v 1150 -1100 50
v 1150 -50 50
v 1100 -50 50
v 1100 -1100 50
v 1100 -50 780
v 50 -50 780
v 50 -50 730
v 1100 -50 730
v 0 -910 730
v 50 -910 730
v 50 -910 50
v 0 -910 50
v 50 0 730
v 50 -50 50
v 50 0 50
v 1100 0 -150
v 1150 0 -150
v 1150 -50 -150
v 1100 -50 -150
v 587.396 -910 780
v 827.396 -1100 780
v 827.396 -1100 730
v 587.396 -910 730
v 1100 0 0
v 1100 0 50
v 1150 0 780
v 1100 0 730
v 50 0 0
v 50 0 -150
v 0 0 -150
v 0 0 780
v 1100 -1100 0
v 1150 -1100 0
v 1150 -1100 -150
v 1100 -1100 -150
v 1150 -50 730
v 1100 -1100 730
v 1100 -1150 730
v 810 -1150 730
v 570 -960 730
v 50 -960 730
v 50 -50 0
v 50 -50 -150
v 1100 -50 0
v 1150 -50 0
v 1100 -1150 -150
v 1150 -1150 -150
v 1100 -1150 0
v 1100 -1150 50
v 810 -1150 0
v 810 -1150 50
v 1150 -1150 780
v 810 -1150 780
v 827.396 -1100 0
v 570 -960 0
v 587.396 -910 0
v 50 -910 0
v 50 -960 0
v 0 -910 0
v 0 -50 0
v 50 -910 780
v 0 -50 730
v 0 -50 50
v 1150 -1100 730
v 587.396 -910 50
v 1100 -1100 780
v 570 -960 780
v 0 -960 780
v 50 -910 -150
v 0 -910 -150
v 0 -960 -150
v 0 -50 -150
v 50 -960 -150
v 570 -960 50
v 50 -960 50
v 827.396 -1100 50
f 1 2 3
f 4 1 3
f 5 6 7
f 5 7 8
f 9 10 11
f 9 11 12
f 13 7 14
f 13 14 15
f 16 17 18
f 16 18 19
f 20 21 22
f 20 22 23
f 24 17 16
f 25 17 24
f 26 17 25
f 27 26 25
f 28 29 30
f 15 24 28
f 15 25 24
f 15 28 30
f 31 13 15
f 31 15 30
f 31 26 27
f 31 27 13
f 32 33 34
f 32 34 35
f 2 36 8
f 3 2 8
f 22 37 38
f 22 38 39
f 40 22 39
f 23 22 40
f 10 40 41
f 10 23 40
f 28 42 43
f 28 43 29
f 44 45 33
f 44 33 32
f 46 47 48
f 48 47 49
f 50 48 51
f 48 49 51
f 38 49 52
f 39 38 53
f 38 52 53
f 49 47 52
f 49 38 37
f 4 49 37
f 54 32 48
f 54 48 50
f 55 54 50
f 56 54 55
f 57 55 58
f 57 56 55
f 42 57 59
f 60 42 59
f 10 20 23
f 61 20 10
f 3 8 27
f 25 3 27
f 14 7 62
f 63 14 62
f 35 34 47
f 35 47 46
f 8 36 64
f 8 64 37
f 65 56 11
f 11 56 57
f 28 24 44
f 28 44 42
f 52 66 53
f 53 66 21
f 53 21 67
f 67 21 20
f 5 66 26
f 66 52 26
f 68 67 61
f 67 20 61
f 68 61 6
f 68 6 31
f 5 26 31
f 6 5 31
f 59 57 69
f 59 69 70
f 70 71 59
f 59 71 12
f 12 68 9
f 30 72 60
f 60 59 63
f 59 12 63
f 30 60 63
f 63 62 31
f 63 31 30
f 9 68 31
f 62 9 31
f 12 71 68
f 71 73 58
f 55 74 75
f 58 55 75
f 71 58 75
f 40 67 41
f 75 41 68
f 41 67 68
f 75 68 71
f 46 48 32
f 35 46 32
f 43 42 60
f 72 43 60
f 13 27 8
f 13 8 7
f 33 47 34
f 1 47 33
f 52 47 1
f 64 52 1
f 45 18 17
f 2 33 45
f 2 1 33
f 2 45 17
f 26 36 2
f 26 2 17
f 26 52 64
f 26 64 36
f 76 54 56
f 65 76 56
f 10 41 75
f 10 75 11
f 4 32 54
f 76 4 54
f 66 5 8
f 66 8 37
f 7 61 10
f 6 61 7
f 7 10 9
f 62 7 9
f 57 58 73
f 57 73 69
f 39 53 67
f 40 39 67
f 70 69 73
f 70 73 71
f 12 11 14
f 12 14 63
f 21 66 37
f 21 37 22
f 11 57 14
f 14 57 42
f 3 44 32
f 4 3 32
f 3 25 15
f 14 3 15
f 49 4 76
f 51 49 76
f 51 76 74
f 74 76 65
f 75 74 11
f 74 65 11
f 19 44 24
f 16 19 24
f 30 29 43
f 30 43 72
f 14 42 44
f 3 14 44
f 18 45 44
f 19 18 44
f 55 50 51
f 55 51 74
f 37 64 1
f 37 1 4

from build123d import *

# Parameters (mm, degrees)
ESTRUSIONE_ESTRUSIONE1_DEPTH = 50
ESTRUSIONE_ESTRUSIONE4_DEPTH = 50
SCHIZZO5_W                   = 50
SCHIZZO5_H                   = 50
ESTRUSIONE_ESTRUSIONE5_DEPTH = 680
SCHIZZO6_W                   = 50
SCHIZZO6_H                   = 50
ESTRUSIONE_ESTRUSIONE6_DEPTH = 150


with BuildPart() as part:
    # Schizzo1 → Estrusione-Estrusione1 (new body)
    with BuildSketch(Plane.XY):
        Polygon((0, 0), (1150, 0), (1150, -1150), (810, -1150), (570, -960), (0, -960), align=None)
        Polygon((50, -50), (1100, -50), (1100, -1100), (827.395936132, -1100), (587.395936132, -910), (50, -910), align=None, mode=Mode.SUBTRACT)
    extrude(amount=ESTRUSIONE_ESTRUSIONE1_DEPTH)



with BuildPart() as body_2:
    # Schizzo4 → Estrusione-Estrusione4 (new body)
    with BuildSketch(Plane(origin=(0, 0, 780), x_dir=(-1, 0, 0), z_dir=(0, 0, -1))):
        Polygon((-1150, -1150), (-810, -1150), (-570, -960), (0, -960), (0, 0), (-1150, 0), align=None)
        Polygon((-50, -50), (-1100, -50), (-1100, -1100), (-827.395936132, -1100), (-587.395936132, -910), (-50, -910), align=None, mode=Mode.SUBTRACT)
    extrude(amount=ESTRUSIONE_ESTRUSIONE4_DEPTH)


with BuildPart() as part_1:
    add(part.part)

    add(body_2.part)  # Estrusione-Estrusione5 merges body 2
    # Schizzo5 → Estrusione-Estrusione5 (add)
    with BuildSketch(Plane(origin=(0, 0, 730), x_dir=(-1, 0, 0), z_dir=(0, 0, -1))):
        with Locations((-1125, -25)):
            Rectangle(SCHIZZO5_W, SCHIZZO5_H)
        with Locations((-25, -25)):
            Rectangle(SCHIZZO5_W, SCHIZZO5_H)
        with Locations((-25, -935)):
            Rectangle(SCHIZZO5_W, SCHIZZO5_H)
        with Locations((-1125, -1125)):
            Rectangle(SCHIZZO5_W, SCHIZZO5_H)
    extrude(amount=ESTRUSIONE_ESTRUSIONE5_DEPTH)

    # Schizzo6 → Estrusione-Estrusione6 (add)
    with BuildSketch(Plane(origin=(0, 0, 0), x_dir=(-1, 0, 0), z_dir=(0, 0, -1))):
        with Locations((-25, -935)):
            Rectangle(SCHIZZO6_W, SCHIZZO6_H)
        with Locations((-1125, -1125)):
            Rectangle(SCHIZZO6_W, SCHIZZO6_H)
        with Locations((-1125, -25)):
            Rectangle(SCHIZZO6_W, SCHIZZO6_H)
        with Locations((-25, -25)):
            Rectangle(SCHIZZO6_W, SCHIZZO6_H)
    extrude(amount=ESTRUSIONE_ESTRUSIONE6_DEPTH)


solid = part_1.part
